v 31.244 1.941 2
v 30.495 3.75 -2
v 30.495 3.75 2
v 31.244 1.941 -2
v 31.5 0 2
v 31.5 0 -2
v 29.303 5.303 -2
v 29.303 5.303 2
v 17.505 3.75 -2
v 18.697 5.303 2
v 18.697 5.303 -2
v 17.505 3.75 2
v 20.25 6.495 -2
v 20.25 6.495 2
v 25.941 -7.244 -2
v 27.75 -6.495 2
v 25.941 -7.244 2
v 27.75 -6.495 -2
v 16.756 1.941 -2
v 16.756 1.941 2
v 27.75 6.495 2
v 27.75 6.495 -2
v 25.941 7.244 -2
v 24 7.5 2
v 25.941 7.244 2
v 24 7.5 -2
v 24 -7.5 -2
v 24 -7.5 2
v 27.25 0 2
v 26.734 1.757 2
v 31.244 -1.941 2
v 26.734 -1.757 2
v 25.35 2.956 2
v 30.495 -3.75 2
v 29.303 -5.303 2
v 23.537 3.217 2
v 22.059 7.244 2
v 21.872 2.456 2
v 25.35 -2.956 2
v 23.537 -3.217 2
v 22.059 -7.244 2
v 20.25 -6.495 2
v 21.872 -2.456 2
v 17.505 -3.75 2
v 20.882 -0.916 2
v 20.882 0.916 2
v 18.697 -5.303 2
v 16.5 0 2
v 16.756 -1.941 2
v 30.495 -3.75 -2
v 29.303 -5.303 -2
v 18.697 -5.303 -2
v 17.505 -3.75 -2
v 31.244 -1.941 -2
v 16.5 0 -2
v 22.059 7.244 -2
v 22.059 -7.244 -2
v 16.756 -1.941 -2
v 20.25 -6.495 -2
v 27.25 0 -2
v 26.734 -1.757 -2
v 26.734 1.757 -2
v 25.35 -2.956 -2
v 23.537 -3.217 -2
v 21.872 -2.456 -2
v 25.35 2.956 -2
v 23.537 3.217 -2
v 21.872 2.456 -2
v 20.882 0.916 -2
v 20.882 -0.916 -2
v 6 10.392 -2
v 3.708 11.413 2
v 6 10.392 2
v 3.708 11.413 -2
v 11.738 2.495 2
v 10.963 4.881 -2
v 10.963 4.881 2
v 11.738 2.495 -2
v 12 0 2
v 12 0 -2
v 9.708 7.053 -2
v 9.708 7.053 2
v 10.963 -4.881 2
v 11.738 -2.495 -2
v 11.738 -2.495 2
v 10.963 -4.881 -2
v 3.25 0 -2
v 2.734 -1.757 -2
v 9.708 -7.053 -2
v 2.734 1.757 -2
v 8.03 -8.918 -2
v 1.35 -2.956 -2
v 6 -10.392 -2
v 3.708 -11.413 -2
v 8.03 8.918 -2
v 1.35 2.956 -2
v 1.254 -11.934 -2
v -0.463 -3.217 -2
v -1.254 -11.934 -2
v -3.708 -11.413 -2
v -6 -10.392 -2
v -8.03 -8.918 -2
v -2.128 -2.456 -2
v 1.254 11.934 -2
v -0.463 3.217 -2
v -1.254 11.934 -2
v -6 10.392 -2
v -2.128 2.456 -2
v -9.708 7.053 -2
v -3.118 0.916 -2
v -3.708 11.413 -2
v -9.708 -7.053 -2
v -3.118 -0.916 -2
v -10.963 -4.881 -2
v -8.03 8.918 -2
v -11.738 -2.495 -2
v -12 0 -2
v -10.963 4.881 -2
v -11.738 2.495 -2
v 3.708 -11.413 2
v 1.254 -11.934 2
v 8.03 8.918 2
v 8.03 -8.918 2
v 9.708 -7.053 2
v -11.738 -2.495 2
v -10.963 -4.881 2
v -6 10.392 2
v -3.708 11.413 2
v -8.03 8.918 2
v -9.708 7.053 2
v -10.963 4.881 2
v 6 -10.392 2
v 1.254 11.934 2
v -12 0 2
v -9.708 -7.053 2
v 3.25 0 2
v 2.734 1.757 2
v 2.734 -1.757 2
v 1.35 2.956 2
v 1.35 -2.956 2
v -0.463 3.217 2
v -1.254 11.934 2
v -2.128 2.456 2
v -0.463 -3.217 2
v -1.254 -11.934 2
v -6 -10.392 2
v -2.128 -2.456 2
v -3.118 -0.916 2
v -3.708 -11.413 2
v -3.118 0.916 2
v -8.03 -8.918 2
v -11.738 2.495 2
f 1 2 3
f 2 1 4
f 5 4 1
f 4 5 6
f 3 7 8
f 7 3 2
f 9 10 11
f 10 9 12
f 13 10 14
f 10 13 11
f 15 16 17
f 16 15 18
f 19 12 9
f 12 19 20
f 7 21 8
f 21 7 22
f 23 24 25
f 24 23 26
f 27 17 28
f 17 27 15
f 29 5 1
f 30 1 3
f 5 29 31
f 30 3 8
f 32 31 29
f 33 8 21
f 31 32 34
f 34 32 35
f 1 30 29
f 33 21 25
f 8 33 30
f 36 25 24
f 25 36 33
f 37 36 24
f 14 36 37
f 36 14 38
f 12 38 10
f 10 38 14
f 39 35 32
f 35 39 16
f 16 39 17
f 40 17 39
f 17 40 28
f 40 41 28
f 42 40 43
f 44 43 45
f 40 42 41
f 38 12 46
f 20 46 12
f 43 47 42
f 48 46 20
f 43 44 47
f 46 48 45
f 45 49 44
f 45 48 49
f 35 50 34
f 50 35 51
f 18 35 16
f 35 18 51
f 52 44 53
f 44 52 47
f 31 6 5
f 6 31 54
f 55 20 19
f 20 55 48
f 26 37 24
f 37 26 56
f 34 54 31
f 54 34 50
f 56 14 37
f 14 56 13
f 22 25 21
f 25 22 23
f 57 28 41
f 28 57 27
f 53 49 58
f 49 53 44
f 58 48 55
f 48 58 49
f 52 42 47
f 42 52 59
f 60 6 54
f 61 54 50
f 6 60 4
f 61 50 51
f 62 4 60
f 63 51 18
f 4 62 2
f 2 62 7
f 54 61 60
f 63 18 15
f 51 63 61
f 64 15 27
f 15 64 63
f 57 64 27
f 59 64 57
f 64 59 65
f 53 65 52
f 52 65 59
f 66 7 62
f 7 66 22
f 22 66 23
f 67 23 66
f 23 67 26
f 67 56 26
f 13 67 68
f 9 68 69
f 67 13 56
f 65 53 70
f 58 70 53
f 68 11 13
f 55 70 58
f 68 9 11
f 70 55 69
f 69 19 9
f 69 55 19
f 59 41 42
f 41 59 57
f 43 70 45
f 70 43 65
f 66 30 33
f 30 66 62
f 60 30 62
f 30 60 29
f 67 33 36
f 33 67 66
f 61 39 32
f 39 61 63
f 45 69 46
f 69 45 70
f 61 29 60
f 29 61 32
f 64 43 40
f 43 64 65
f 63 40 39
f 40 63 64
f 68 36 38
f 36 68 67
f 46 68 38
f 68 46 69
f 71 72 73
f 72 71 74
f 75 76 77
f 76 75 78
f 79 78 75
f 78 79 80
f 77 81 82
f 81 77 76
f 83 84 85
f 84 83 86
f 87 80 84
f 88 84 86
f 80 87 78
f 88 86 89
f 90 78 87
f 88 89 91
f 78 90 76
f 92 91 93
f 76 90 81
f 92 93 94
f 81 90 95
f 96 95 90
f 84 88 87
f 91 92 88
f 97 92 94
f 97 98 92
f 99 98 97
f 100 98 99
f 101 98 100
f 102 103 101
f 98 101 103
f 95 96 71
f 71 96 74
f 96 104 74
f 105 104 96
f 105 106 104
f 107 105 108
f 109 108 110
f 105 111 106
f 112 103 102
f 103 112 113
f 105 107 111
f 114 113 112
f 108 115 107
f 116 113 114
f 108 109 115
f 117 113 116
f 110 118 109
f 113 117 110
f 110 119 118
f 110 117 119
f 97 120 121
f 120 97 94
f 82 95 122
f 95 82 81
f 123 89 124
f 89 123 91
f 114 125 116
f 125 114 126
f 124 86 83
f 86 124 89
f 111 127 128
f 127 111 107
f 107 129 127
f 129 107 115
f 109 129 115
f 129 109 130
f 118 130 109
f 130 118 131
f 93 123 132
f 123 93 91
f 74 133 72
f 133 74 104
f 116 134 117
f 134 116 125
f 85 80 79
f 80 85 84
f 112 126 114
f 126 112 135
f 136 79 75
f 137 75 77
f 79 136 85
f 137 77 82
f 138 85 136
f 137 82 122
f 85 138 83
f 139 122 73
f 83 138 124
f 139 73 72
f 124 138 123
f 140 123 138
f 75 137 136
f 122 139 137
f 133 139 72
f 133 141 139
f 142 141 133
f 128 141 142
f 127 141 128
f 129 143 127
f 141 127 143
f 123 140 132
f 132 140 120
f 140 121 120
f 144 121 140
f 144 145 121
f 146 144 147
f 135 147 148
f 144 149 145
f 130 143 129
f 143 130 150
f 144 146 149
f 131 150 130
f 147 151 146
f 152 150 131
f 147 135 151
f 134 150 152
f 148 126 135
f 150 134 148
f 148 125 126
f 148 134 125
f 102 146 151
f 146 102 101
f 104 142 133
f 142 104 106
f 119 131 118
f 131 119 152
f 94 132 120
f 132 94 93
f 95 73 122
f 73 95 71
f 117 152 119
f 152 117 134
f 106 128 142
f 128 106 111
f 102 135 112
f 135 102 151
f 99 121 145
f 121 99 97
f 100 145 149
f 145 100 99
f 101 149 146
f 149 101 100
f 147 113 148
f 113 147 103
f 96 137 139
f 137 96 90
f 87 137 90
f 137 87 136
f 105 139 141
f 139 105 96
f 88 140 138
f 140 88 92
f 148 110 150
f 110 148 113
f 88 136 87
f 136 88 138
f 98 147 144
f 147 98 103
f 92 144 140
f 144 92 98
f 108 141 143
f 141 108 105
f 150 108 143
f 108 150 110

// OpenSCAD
d_small_nut = 15;
d_big_nut = 24;
h_nut = 4;

translate([d_big_nut, 0, 0])
    nut_small();
    nut_big();

module nut_small() {
    difference() {
        cylinder(d = d_small_nut, h = h_nut, center = true);
        cylinder(h = 40, d = 6.5, center = true);
    }
}

module nut_big() {
    difference() {
        cylinder(d = d_big_nut, h = h_nut, center = true);
        cylinder(h = 40, d = 6.5, center = true);
    }
}
